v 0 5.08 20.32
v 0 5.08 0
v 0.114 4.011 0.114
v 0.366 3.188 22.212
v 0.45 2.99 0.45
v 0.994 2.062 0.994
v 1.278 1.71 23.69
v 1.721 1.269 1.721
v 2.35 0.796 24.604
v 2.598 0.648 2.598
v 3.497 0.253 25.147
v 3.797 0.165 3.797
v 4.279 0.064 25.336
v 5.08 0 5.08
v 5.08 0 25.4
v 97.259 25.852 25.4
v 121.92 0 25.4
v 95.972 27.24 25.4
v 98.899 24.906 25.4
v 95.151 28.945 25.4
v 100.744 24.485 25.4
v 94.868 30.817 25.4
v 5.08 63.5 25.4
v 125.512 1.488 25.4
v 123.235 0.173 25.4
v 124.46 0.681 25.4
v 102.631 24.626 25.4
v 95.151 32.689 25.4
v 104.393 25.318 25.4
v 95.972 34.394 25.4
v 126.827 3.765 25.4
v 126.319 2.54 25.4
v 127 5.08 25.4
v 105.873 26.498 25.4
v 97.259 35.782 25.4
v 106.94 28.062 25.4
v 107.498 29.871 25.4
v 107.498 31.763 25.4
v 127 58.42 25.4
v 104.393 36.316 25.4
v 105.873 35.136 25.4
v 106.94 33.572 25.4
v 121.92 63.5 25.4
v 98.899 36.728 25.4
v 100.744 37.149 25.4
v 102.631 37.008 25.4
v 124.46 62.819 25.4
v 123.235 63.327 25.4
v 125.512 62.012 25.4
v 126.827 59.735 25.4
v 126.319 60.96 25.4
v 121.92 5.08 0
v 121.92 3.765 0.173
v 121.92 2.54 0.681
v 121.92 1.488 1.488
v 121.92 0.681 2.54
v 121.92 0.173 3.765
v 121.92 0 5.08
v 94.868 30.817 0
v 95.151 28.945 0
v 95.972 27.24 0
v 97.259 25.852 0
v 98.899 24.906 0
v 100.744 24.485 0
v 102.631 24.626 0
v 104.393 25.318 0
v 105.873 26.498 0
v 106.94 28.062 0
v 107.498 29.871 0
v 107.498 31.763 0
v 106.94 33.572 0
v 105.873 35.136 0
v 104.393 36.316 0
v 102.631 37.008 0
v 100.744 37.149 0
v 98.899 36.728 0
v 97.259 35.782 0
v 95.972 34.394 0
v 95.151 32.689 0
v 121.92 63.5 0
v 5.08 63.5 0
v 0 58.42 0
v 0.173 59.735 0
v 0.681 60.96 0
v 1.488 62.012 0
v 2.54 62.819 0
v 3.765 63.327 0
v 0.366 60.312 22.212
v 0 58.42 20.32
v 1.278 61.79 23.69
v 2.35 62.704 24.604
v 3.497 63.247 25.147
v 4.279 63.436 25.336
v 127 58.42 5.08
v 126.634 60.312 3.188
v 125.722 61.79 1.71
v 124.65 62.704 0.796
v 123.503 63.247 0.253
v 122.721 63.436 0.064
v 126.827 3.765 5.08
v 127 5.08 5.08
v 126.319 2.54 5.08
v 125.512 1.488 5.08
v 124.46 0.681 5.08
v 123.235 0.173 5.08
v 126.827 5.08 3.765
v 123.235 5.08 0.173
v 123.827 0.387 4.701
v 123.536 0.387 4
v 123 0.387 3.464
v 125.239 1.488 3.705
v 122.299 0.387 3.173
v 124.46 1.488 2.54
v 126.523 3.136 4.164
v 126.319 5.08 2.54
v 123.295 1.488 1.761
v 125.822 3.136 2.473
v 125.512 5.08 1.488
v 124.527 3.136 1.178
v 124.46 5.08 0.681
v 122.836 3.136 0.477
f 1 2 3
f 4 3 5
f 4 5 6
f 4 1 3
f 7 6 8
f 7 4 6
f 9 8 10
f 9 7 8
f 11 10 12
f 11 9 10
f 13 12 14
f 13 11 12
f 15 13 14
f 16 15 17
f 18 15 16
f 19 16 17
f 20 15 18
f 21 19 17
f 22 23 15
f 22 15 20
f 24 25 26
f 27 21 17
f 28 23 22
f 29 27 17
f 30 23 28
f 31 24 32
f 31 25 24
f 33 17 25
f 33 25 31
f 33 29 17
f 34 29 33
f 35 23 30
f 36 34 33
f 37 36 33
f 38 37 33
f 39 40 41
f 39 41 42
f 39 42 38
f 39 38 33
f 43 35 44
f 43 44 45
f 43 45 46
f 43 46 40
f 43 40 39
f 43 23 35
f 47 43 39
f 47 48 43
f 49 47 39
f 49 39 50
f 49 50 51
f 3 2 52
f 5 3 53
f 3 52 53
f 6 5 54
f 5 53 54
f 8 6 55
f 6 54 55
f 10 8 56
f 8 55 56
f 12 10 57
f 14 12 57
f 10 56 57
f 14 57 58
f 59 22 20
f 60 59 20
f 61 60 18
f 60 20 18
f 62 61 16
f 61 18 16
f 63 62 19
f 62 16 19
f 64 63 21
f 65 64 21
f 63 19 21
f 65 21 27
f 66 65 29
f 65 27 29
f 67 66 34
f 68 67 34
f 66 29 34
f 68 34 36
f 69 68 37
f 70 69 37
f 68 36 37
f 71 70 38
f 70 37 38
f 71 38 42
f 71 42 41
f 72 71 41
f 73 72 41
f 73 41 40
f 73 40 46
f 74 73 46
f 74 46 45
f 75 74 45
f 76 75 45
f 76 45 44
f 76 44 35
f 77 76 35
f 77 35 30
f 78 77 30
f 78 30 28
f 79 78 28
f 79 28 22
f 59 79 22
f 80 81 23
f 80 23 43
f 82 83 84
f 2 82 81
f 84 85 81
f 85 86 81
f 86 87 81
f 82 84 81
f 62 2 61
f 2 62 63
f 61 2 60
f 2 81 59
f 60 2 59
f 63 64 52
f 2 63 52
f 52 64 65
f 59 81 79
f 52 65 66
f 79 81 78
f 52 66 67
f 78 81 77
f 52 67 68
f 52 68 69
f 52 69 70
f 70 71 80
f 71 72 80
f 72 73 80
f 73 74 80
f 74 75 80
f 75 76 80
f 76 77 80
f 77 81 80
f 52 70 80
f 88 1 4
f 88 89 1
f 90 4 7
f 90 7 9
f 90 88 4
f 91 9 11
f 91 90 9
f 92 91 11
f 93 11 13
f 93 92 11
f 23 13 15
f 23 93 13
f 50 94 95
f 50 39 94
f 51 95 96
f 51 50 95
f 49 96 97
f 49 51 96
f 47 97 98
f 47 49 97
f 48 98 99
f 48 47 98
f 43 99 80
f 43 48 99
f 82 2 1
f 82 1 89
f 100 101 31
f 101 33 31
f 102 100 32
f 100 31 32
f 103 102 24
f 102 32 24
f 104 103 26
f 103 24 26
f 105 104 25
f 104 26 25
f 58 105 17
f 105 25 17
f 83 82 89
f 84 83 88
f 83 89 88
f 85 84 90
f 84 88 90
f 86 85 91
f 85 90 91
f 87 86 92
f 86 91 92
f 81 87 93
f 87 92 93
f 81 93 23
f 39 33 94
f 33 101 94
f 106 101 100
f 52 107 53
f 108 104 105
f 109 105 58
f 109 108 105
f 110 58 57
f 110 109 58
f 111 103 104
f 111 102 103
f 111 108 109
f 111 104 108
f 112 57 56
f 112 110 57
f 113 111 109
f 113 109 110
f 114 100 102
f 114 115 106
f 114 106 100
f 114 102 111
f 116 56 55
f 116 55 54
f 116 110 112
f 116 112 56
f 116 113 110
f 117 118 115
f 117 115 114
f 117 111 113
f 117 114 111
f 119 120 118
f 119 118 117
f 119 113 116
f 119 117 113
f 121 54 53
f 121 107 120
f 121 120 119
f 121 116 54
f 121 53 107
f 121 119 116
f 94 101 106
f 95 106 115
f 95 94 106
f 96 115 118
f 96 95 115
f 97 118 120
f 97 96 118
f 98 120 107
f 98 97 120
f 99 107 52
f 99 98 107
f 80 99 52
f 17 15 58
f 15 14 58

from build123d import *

# Parameters (mm, degrees)
F0_W           = 127
F0_H           = 63.5
F1_DEPTH       = 25.4
F3_D           = 12.7
F3_CBORE_D     = 12.7
F3_CBORE_DEPTH = 6.35
F4_R           = 5.08


with BuildPart() as f1:
    # F0 (on Top) → F1 (new body)
    with BuildSketch(Plane.XY):
        with Locations((63.5, 31.75)):
            Rectangle(F0_W, F0_H)
    extrude(amount=F1_DEPTH)

    # F3 (through all)
    with Locations(Plane(origin=(0, 0, 0), x_dir=(1, 0, 0), z_dir=(0, 0, -1))):
        with Locations((101.218447, -30.816942)):
            CounterBoreHole(F3_D / 2, F3_CBORE_D / 2, F3_CBORE_DEPTH)

    # F4
    f4_edges = [f1.edges().sort_by_distance(p)[0] for p in [
        (127, 31.75, 0),
        (127, 63.5, 12.7),
        (127, 0, 12.7),
        (63.5, 0, 0),
        (0, 0, 12.7),
        (0, 31.75, 25.4),
        (0, 63.5, 12.7),
    ]]
    fillet(f4_edges, radius=F4_R)


solid = f1.part
